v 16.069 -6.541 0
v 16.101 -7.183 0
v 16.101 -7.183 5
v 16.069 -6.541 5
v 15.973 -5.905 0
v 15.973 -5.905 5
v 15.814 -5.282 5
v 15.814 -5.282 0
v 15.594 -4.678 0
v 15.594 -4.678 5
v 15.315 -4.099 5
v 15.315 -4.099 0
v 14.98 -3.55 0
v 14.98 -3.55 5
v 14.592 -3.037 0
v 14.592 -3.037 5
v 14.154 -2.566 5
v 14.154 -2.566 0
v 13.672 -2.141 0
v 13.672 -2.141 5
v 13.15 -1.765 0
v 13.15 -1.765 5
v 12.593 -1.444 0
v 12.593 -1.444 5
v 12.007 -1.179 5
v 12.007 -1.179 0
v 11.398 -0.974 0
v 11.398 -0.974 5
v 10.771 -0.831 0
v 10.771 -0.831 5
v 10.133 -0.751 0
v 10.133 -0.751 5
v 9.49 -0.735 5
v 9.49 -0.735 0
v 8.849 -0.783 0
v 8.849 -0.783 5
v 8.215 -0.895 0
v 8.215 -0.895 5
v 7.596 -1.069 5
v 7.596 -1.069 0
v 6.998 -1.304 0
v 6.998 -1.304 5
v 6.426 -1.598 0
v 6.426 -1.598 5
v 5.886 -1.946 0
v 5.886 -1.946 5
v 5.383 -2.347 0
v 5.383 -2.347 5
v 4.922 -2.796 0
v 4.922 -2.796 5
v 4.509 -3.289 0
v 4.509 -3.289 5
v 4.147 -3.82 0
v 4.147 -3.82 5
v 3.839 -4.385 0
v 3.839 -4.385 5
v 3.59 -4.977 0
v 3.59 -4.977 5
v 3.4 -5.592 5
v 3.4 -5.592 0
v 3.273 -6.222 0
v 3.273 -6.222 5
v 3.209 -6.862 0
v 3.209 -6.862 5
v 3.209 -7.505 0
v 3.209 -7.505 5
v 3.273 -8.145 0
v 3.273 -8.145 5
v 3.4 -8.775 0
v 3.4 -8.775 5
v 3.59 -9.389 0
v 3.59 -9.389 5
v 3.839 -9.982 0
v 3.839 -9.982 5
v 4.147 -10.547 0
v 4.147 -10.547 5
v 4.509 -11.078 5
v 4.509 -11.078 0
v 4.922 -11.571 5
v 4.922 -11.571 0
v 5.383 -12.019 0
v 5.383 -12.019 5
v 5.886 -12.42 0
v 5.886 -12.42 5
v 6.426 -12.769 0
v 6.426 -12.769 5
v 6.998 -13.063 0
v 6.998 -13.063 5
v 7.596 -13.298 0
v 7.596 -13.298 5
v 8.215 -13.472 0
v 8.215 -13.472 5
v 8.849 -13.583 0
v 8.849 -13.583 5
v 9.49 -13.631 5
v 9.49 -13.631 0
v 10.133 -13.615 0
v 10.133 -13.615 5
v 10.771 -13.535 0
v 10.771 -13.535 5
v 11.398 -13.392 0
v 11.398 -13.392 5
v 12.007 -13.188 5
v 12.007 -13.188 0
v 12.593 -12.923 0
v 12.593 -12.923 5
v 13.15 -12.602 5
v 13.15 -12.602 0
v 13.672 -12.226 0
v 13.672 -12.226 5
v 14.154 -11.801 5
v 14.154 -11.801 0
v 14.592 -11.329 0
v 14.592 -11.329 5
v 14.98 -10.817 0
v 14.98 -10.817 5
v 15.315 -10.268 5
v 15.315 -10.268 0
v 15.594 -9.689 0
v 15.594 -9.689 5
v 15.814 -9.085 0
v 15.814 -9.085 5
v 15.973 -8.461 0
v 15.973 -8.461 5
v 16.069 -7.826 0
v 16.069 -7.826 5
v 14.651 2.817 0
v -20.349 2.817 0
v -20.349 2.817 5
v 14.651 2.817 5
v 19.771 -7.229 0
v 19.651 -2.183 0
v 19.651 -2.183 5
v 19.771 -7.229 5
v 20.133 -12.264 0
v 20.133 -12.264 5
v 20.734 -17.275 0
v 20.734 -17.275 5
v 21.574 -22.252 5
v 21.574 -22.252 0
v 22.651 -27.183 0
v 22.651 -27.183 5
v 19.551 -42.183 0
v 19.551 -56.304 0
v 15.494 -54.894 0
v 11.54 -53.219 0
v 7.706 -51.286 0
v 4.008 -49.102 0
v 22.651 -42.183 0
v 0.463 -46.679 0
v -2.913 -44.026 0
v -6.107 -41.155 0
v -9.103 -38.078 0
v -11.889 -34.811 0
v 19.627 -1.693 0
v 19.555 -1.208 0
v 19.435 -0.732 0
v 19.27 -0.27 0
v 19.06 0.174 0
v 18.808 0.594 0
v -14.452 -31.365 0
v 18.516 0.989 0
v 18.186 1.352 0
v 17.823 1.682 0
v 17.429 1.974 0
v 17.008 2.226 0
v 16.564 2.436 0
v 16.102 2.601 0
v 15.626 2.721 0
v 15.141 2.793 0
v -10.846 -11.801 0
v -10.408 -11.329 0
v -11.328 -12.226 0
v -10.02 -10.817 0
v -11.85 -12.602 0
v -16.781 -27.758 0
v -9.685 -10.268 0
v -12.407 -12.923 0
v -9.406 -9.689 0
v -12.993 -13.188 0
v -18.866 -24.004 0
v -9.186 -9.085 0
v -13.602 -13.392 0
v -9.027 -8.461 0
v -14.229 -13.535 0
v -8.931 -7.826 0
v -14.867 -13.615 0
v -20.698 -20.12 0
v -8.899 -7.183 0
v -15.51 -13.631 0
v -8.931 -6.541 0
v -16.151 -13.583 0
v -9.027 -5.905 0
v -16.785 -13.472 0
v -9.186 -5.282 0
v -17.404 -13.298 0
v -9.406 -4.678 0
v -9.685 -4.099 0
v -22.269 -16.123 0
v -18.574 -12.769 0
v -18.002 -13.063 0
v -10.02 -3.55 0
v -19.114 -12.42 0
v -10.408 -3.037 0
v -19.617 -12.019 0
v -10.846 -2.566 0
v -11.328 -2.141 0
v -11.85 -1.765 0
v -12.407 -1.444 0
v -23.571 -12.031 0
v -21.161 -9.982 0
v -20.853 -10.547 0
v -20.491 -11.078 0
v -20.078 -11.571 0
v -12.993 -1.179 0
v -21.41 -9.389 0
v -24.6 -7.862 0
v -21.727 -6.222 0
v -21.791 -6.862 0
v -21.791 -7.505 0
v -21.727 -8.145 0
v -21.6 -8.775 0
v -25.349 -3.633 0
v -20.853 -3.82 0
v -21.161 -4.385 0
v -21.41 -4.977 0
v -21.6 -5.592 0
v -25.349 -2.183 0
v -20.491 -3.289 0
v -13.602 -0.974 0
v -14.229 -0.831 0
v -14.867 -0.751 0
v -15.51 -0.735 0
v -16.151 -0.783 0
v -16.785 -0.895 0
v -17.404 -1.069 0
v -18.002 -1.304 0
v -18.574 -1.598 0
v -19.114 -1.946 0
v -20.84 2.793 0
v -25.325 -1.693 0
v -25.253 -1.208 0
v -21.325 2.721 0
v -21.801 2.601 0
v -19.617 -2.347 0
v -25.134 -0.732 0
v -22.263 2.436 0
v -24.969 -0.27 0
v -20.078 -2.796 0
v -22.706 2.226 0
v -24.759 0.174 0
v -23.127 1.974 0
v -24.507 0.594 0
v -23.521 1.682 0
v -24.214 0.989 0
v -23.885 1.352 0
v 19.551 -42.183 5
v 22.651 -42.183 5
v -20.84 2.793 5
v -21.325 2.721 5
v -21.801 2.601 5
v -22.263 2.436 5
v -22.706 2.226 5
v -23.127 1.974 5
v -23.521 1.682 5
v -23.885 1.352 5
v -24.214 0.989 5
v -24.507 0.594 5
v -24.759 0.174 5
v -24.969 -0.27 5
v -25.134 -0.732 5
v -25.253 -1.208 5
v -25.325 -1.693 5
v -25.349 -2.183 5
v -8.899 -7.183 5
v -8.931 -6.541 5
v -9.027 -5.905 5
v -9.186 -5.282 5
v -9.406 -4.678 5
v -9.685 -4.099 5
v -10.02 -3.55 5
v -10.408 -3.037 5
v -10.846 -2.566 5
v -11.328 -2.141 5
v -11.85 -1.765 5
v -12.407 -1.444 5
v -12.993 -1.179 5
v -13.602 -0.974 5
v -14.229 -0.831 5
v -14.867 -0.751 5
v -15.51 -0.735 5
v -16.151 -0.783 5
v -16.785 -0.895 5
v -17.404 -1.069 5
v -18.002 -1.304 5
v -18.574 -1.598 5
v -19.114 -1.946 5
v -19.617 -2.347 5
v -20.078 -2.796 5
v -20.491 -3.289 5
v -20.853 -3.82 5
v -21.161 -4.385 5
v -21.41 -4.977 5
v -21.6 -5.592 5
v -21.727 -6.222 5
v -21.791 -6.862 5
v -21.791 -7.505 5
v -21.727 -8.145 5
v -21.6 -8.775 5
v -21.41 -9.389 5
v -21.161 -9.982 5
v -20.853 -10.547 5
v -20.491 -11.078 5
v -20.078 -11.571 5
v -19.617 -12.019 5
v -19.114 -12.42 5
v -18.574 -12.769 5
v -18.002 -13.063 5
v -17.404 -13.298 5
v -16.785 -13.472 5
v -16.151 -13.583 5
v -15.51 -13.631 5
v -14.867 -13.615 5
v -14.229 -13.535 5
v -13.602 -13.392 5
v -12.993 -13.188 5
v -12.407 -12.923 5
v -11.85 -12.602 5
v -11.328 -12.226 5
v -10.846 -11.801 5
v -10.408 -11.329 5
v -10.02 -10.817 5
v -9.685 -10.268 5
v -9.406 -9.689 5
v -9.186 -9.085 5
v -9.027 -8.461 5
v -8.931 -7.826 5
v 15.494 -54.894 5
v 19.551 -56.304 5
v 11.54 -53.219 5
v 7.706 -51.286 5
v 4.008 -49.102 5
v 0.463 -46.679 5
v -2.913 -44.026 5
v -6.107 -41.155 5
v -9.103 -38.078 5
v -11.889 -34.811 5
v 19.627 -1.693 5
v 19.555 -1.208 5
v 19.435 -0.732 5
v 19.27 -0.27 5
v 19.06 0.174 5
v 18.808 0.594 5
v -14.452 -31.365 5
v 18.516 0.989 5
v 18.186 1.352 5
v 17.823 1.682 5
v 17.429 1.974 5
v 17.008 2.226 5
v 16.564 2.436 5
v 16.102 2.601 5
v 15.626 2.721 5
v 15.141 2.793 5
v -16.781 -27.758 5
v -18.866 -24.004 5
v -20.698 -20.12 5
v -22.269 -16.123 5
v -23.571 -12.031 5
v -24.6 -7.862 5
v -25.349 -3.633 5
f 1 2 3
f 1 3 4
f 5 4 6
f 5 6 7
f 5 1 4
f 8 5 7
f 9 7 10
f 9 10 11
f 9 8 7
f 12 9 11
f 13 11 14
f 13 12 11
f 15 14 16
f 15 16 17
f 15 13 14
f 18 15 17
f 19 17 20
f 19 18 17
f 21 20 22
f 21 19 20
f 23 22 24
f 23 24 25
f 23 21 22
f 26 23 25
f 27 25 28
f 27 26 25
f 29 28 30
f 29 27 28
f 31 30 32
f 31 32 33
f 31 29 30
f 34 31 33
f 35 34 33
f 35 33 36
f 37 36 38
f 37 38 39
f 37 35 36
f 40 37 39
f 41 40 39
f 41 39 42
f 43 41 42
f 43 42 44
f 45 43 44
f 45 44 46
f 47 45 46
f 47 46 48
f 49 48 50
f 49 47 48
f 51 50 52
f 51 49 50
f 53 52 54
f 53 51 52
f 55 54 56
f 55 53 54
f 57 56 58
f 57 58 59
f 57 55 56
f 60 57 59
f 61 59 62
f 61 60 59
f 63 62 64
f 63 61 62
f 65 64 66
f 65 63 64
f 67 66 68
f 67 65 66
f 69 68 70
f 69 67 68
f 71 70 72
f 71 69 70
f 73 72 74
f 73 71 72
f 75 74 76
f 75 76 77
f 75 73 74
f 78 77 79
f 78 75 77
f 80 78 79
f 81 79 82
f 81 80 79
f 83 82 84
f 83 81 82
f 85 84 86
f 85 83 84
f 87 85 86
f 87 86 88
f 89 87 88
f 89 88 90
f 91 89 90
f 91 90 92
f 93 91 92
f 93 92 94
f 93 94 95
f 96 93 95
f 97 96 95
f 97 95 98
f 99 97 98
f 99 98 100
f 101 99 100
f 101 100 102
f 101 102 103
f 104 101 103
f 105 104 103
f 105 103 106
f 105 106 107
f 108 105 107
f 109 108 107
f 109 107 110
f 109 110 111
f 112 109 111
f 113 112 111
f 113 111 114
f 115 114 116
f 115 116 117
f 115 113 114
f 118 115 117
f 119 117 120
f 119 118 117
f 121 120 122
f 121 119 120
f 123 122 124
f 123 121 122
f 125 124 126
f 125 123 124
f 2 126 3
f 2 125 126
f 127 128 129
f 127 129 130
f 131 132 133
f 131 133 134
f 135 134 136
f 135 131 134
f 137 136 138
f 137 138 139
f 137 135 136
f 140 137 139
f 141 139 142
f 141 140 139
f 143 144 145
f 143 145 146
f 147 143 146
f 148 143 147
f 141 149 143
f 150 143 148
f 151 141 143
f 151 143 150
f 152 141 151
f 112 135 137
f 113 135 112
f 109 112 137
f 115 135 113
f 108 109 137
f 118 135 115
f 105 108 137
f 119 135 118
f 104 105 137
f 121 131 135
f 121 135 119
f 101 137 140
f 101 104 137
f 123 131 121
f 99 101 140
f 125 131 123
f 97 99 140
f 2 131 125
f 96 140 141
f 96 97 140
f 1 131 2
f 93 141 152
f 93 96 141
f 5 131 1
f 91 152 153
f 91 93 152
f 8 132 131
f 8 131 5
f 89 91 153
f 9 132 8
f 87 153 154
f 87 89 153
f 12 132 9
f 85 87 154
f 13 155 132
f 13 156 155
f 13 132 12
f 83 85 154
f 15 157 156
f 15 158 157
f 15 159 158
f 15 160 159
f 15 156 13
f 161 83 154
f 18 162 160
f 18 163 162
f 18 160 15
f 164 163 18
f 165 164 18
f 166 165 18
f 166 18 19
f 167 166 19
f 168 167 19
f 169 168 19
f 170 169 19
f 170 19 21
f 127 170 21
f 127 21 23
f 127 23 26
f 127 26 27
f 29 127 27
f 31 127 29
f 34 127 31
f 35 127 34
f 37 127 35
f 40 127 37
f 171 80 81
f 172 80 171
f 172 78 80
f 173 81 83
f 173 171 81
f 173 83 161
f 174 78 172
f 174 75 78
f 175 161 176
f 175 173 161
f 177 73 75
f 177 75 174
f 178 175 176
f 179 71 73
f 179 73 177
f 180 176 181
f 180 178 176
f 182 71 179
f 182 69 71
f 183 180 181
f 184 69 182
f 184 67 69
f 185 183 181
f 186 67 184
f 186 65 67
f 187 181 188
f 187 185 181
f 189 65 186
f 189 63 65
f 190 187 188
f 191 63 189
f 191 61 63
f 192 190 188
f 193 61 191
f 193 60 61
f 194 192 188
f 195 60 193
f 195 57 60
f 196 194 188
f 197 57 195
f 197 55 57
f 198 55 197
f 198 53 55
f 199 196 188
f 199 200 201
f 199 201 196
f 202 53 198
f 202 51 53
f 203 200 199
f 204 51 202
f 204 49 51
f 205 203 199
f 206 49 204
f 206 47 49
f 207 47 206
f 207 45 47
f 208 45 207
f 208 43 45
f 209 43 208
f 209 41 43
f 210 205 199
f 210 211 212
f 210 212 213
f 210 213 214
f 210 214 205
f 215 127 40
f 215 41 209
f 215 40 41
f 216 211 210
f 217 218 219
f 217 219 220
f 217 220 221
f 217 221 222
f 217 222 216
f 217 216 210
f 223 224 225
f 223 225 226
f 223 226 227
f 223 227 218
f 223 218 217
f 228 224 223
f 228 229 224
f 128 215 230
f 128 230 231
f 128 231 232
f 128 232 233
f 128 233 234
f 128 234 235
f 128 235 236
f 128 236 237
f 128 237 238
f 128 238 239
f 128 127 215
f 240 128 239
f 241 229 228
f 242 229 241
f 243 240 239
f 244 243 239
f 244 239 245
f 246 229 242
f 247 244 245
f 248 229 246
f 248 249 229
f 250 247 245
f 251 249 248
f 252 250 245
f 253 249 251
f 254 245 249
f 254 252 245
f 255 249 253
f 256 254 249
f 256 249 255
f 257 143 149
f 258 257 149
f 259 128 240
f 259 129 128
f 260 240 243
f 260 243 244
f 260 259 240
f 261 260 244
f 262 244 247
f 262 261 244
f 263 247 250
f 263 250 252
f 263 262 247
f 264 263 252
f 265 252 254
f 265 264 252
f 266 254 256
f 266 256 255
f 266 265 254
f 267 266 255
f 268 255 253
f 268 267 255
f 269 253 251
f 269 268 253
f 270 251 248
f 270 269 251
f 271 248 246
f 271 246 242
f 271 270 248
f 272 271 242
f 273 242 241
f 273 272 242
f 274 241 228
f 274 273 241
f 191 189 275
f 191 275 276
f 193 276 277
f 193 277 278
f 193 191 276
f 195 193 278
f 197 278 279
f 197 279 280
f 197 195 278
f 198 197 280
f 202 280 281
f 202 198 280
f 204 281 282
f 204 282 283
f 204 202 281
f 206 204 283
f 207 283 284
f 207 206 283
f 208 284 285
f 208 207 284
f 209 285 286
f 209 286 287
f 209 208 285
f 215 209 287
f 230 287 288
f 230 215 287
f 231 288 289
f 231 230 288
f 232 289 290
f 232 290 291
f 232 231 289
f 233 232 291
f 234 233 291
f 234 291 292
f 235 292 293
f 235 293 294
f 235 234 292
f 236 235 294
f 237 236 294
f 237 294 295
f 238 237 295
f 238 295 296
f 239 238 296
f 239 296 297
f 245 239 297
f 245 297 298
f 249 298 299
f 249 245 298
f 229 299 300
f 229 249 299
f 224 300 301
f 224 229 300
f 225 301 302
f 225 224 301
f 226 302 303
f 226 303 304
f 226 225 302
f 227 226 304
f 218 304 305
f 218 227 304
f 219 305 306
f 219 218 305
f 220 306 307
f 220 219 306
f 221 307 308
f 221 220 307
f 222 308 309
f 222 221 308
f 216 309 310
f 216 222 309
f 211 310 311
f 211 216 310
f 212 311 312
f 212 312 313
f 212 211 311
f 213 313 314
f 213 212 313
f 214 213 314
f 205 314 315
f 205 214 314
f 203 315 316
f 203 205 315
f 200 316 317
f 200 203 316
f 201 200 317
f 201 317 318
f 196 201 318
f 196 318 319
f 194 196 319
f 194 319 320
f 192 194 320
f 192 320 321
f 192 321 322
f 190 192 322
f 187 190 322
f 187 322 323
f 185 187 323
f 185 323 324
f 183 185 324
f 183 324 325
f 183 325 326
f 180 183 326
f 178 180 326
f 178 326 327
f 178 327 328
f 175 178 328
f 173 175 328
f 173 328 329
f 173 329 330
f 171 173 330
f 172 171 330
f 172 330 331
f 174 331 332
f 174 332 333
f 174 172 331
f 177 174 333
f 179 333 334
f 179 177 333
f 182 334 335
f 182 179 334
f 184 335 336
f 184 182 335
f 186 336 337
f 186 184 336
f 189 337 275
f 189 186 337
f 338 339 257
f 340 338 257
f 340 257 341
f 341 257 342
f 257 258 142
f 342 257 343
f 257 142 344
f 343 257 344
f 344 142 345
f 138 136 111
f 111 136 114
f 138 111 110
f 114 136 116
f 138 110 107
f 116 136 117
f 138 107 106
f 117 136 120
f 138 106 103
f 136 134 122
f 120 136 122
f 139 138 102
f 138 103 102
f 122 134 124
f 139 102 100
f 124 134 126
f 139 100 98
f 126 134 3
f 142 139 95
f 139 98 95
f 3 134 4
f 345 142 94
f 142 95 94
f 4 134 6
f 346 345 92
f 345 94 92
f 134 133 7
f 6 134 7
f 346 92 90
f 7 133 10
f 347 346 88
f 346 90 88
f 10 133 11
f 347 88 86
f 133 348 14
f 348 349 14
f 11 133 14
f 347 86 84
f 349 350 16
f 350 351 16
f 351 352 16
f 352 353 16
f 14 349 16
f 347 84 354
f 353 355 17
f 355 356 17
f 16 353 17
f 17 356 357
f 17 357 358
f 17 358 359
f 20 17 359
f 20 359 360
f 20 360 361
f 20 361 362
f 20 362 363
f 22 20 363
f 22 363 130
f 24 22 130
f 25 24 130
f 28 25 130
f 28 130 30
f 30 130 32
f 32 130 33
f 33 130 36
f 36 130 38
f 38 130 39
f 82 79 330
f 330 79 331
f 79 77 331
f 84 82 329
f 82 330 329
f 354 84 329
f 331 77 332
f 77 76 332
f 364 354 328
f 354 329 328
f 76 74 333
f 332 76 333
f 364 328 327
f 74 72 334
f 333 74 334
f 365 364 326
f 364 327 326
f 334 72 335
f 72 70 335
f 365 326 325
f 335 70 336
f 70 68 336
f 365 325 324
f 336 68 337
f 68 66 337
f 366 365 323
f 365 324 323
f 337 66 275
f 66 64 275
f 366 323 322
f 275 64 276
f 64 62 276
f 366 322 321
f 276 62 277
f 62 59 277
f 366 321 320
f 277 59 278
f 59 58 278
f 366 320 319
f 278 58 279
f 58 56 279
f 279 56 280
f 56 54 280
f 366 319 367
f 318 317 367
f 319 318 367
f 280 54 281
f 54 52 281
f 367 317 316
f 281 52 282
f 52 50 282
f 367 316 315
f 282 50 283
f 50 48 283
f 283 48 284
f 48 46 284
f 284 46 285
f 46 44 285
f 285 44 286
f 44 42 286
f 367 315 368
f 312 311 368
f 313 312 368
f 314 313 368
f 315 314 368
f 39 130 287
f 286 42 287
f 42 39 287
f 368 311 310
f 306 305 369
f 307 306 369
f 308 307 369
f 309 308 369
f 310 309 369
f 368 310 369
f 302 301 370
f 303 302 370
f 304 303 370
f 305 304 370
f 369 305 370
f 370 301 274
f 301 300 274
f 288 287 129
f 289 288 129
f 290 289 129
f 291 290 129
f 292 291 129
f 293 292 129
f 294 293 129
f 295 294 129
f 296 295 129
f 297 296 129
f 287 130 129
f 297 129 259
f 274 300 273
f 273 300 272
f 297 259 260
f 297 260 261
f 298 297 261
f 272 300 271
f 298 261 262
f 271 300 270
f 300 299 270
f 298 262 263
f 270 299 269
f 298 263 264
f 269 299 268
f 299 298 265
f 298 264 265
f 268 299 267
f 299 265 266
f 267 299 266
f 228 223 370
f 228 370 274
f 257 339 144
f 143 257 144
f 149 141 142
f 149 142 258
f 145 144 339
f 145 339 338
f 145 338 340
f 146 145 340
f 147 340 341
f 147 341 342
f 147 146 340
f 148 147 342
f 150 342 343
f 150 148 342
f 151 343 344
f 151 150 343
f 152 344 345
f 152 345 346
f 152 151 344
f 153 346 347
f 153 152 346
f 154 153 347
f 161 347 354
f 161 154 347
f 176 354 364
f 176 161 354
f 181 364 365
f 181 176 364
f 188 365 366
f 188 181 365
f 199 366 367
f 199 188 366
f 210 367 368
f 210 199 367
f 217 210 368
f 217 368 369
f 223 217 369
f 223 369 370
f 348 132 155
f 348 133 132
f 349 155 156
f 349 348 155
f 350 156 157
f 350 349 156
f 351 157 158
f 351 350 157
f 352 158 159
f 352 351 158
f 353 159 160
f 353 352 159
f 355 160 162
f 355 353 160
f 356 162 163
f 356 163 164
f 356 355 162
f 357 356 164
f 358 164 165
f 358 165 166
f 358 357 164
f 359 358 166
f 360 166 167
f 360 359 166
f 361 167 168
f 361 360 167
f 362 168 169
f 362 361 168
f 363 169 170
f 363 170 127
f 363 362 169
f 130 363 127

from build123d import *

# Parameters (mm, degrees)
SKETCH2_R           = 6.45
BOSS_EXTRUDE1_DEPTH = 5
CUT_EXTRUDE1_START  = -57.18341
SKETCH3_W           = 3.1
SKETCH3_H           = 5
CUT_EXTRUDE1_DEPTH  = 15
FILLET1_R           = 5


with BuildPart() as part:
    # Sketch2 → Boss-Extrude1 (new body)
    with BuildSketch(Plane.XY):
        with BuildLine():
            Line((22.650655022, -27.183406114), (22.650655022, -57.183406114))
            ThreePointArc((22.650655022, -57.183406114), (-9.462495777, -37.680698146), (-25.349344978, -3.633406114))
            Line((-25.349344978, -3.633406114), (-25.349344978, 2.816593886))
            Line((-25.349344978, 2.816593886), (19.650655022, 2.816593886))
            Line((19.650655022, 2.816593886), (19.650655022, -2.183406114))
            ThreePointArc((19.650655022, -2.183406114), (20.403335755, -14.773084426), (22.650655022, -27.183406114))
        make_face()
        with Locations((9.650655022, -7.183406114)):
            Circle(SKETCH2_R, mode=Mode.SUBTRACT)
        with Locations((-15.349344978, -7.183406114)):
            Circle(SKETCH2_R, mode=Mode.SUBTRACT)
    extrude(amount=BOSS_EXTRUDE1_DEPTH)

    # Sketch3 → Cut-Extrude1 (cut)
    with BuildSketch(Plane(origin=(0, 0, 0), x_dir=(1, 0, 0), z_dir=(0, 1, 0)).offset(CUT_EXTRUDE1_START)):
        with Locations((21.100655022, -2.5)):
            Rectangle(SKETCH3_W, SKETCH3_H)
    extrude(amount=CUT_EXTRUDE1_DEPTH, mode=Mode.SUBTRACT)

    # Fillet1
    fillet1_edges = [part.edges().sort_by_distance(p)[0] for p in [
        (-25.349344978, 2.816593886, 2.5),
        (19.650655022, 2.816593886, 2.5),
    ]]
    fillet(fillet1_edges, radius=FILLET1_R - 0.0001)  # a hair under: the kernel refuses the full size


solid = part.part
